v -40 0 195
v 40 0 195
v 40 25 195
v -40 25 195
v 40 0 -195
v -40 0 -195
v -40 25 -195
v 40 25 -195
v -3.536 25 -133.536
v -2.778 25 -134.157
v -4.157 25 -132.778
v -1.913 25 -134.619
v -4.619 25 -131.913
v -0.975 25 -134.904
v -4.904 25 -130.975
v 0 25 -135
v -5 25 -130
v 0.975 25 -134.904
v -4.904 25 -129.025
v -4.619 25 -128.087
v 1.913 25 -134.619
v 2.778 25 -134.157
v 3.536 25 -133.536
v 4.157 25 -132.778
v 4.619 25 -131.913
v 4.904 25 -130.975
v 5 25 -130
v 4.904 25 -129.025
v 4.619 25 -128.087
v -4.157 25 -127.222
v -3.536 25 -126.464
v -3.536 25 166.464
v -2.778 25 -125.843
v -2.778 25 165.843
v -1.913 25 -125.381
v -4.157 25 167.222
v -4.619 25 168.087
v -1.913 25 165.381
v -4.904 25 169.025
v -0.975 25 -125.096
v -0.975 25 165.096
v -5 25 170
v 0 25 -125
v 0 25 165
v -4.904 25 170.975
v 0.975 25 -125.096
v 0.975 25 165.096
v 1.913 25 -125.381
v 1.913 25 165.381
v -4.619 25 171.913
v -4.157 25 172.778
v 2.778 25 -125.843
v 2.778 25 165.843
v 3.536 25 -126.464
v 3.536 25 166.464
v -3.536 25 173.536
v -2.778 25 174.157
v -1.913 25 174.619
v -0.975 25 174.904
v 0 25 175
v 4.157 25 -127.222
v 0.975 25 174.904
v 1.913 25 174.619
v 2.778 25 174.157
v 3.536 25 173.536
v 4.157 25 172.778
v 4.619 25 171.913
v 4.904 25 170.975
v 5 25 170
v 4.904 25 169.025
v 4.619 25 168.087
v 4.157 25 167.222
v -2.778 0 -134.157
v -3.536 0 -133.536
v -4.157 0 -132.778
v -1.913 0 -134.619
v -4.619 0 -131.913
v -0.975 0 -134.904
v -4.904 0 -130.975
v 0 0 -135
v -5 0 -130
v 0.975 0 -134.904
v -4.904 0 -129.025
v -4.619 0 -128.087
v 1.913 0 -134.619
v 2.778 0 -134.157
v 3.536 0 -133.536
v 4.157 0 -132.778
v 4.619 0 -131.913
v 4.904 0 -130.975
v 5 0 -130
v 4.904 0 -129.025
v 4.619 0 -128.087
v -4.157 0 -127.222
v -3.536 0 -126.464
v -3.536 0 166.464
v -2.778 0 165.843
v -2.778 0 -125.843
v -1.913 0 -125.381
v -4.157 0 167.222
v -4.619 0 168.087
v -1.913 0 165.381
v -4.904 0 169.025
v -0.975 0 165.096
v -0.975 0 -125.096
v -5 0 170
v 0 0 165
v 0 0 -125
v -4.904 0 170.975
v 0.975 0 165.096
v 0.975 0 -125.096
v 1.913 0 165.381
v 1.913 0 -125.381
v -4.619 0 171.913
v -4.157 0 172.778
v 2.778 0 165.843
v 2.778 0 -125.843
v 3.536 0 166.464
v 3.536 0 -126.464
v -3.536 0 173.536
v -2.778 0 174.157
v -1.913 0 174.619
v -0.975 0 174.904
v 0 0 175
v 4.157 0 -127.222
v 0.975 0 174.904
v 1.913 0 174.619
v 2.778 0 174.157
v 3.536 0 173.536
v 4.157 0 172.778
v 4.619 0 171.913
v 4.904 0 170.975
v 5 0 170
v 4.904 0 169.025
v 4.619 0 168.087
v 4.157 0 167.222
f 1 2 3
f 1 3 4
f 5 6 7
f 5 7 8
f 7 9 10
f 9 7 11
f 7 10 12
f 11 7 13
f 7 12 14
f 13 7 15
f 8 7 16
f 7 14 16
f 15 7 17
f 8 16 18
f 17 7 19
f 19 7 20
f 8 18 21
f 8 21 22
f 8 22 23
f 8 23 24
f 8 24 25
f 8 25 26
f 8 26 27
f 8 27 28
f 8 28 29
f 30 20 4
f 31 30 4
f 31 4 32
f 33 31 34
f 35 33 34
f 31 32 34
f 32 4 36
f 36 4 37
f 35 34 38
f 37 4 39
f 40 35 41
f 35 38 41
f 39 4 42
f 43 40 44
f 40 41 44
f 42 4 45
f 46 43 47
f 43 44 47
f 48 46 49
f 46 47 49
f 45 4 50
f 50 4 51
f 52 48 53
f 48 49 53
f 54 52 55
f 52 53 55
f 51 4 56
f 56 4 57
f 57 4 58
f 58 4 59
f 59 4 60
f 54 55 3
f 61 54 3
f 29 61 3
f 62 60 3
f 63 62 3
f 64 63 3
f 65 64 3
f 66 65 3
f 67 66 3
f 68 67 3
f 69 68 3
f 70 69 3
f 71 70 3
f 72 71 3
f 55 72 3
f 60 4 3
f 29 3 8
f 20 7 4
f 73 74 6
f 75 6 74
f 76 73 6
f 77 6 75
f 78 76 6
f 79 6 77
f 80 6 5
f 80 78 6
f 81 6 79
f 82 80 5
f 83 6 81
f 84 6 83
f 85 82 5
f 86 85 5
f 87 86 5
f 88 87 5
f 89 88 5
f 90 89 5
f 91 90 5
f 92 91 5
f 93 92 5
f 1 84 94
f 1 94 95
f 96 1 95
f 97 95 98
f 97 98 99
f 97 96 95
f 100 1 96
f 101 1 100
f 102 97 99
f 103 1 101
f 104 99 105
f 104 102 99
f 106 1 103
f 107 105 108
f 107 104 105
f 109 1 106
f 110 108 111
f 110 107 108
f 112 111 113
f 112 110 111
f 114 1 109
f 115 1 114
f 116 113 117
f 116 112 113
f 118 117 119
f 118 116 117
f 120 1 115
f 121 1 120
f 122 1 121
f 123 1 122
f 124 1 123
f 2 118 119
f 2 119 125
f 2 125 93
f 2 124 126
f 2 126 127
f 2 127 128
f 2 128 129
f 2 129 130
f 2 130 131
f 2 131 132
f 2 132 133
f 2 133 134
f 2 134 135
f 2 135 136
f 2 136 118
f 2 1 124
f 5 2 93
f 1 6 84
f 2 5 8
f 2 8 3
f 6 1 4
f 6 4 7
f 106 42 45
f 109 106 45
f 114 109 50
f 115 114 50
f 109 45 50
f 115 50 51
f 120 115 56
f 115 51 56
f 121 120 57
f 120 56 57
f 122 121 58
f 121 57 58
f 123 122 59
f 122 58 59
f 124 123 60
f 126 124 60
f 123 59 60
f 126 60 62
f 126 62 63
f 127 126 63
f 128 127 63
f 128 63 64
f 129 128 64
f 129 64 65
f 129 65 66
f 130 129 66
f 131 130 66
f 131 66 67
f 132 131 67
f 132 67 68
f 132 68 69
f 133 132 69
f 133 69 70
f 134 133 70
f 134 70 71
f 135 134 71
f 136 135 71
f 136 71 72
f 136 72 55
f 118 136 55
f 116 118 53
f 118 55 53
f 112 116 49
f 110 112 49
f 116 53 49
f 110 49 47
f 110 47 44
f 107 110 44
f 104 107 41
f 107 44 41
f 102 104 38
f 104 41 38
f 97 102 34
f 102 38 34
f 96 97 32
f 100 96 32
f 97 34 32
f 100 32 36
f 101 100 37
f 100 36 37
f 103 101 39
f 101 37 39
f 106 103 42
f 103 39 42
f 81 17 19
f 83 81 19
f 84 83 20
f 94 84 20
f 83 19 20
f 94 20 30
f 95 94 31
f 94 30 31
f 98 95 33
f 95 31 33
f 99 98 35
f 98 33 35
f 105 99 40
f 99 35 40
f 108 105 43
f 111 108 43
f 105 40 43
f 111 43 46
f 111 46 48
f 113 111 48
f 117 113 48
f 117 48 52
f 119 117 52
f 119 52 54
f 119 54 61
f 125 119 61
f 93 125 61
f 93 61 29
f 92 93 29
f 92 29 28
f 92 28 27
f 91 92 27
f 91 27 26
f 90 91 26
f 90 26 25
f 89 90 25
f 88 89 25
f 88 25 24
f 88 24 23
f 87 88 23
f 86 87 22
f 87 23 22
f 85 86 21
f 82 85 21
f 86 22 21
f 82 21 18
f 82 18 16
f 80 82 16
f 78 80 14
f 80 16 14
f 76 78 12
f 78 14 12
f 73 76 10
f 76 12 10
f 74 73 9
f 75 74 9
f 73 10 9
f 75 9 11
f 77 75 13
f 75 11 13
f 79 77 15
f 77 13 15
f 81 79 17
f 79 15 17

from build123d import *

# Parameters (mm, degrees)
F0_W     = 40
F0_H     = 300
F0_H_2   = 25
F0_H_3   = 65
F1_DEPTH = 25
F2_D     = 10


with BuildPart() as f1:
    # F0 (on Front) → F1 (new body)
    with BuildSketch(Plane.XZ):
        with Locations((-20, 20)):
            Rectangle(F0_W, F0_H)
        with Locations((20, 20)):
            Rectangle(F0_W, F0_H)
        with Locations((20, 182.5)):
            Rectangle(F0_W, F0_H_2)
        with Locations((-20, 182.5)):
            Rectangle(F0_W, F0_H_2)
        with Locations((20, -162.5)):
            Rectangle(F0_W, F0_H_3)
        with Locations((-20, -162.5)):
            Rectangle(F0_W, F0_H_3)
    extrude(amount=-F1_DEPTH)

    # F2 (through all)
    with Locations(Plane.XZ):
        with Locations((0, 170), (0, -130)):
            Hole(F2_D / 2)


solid = f1.part
